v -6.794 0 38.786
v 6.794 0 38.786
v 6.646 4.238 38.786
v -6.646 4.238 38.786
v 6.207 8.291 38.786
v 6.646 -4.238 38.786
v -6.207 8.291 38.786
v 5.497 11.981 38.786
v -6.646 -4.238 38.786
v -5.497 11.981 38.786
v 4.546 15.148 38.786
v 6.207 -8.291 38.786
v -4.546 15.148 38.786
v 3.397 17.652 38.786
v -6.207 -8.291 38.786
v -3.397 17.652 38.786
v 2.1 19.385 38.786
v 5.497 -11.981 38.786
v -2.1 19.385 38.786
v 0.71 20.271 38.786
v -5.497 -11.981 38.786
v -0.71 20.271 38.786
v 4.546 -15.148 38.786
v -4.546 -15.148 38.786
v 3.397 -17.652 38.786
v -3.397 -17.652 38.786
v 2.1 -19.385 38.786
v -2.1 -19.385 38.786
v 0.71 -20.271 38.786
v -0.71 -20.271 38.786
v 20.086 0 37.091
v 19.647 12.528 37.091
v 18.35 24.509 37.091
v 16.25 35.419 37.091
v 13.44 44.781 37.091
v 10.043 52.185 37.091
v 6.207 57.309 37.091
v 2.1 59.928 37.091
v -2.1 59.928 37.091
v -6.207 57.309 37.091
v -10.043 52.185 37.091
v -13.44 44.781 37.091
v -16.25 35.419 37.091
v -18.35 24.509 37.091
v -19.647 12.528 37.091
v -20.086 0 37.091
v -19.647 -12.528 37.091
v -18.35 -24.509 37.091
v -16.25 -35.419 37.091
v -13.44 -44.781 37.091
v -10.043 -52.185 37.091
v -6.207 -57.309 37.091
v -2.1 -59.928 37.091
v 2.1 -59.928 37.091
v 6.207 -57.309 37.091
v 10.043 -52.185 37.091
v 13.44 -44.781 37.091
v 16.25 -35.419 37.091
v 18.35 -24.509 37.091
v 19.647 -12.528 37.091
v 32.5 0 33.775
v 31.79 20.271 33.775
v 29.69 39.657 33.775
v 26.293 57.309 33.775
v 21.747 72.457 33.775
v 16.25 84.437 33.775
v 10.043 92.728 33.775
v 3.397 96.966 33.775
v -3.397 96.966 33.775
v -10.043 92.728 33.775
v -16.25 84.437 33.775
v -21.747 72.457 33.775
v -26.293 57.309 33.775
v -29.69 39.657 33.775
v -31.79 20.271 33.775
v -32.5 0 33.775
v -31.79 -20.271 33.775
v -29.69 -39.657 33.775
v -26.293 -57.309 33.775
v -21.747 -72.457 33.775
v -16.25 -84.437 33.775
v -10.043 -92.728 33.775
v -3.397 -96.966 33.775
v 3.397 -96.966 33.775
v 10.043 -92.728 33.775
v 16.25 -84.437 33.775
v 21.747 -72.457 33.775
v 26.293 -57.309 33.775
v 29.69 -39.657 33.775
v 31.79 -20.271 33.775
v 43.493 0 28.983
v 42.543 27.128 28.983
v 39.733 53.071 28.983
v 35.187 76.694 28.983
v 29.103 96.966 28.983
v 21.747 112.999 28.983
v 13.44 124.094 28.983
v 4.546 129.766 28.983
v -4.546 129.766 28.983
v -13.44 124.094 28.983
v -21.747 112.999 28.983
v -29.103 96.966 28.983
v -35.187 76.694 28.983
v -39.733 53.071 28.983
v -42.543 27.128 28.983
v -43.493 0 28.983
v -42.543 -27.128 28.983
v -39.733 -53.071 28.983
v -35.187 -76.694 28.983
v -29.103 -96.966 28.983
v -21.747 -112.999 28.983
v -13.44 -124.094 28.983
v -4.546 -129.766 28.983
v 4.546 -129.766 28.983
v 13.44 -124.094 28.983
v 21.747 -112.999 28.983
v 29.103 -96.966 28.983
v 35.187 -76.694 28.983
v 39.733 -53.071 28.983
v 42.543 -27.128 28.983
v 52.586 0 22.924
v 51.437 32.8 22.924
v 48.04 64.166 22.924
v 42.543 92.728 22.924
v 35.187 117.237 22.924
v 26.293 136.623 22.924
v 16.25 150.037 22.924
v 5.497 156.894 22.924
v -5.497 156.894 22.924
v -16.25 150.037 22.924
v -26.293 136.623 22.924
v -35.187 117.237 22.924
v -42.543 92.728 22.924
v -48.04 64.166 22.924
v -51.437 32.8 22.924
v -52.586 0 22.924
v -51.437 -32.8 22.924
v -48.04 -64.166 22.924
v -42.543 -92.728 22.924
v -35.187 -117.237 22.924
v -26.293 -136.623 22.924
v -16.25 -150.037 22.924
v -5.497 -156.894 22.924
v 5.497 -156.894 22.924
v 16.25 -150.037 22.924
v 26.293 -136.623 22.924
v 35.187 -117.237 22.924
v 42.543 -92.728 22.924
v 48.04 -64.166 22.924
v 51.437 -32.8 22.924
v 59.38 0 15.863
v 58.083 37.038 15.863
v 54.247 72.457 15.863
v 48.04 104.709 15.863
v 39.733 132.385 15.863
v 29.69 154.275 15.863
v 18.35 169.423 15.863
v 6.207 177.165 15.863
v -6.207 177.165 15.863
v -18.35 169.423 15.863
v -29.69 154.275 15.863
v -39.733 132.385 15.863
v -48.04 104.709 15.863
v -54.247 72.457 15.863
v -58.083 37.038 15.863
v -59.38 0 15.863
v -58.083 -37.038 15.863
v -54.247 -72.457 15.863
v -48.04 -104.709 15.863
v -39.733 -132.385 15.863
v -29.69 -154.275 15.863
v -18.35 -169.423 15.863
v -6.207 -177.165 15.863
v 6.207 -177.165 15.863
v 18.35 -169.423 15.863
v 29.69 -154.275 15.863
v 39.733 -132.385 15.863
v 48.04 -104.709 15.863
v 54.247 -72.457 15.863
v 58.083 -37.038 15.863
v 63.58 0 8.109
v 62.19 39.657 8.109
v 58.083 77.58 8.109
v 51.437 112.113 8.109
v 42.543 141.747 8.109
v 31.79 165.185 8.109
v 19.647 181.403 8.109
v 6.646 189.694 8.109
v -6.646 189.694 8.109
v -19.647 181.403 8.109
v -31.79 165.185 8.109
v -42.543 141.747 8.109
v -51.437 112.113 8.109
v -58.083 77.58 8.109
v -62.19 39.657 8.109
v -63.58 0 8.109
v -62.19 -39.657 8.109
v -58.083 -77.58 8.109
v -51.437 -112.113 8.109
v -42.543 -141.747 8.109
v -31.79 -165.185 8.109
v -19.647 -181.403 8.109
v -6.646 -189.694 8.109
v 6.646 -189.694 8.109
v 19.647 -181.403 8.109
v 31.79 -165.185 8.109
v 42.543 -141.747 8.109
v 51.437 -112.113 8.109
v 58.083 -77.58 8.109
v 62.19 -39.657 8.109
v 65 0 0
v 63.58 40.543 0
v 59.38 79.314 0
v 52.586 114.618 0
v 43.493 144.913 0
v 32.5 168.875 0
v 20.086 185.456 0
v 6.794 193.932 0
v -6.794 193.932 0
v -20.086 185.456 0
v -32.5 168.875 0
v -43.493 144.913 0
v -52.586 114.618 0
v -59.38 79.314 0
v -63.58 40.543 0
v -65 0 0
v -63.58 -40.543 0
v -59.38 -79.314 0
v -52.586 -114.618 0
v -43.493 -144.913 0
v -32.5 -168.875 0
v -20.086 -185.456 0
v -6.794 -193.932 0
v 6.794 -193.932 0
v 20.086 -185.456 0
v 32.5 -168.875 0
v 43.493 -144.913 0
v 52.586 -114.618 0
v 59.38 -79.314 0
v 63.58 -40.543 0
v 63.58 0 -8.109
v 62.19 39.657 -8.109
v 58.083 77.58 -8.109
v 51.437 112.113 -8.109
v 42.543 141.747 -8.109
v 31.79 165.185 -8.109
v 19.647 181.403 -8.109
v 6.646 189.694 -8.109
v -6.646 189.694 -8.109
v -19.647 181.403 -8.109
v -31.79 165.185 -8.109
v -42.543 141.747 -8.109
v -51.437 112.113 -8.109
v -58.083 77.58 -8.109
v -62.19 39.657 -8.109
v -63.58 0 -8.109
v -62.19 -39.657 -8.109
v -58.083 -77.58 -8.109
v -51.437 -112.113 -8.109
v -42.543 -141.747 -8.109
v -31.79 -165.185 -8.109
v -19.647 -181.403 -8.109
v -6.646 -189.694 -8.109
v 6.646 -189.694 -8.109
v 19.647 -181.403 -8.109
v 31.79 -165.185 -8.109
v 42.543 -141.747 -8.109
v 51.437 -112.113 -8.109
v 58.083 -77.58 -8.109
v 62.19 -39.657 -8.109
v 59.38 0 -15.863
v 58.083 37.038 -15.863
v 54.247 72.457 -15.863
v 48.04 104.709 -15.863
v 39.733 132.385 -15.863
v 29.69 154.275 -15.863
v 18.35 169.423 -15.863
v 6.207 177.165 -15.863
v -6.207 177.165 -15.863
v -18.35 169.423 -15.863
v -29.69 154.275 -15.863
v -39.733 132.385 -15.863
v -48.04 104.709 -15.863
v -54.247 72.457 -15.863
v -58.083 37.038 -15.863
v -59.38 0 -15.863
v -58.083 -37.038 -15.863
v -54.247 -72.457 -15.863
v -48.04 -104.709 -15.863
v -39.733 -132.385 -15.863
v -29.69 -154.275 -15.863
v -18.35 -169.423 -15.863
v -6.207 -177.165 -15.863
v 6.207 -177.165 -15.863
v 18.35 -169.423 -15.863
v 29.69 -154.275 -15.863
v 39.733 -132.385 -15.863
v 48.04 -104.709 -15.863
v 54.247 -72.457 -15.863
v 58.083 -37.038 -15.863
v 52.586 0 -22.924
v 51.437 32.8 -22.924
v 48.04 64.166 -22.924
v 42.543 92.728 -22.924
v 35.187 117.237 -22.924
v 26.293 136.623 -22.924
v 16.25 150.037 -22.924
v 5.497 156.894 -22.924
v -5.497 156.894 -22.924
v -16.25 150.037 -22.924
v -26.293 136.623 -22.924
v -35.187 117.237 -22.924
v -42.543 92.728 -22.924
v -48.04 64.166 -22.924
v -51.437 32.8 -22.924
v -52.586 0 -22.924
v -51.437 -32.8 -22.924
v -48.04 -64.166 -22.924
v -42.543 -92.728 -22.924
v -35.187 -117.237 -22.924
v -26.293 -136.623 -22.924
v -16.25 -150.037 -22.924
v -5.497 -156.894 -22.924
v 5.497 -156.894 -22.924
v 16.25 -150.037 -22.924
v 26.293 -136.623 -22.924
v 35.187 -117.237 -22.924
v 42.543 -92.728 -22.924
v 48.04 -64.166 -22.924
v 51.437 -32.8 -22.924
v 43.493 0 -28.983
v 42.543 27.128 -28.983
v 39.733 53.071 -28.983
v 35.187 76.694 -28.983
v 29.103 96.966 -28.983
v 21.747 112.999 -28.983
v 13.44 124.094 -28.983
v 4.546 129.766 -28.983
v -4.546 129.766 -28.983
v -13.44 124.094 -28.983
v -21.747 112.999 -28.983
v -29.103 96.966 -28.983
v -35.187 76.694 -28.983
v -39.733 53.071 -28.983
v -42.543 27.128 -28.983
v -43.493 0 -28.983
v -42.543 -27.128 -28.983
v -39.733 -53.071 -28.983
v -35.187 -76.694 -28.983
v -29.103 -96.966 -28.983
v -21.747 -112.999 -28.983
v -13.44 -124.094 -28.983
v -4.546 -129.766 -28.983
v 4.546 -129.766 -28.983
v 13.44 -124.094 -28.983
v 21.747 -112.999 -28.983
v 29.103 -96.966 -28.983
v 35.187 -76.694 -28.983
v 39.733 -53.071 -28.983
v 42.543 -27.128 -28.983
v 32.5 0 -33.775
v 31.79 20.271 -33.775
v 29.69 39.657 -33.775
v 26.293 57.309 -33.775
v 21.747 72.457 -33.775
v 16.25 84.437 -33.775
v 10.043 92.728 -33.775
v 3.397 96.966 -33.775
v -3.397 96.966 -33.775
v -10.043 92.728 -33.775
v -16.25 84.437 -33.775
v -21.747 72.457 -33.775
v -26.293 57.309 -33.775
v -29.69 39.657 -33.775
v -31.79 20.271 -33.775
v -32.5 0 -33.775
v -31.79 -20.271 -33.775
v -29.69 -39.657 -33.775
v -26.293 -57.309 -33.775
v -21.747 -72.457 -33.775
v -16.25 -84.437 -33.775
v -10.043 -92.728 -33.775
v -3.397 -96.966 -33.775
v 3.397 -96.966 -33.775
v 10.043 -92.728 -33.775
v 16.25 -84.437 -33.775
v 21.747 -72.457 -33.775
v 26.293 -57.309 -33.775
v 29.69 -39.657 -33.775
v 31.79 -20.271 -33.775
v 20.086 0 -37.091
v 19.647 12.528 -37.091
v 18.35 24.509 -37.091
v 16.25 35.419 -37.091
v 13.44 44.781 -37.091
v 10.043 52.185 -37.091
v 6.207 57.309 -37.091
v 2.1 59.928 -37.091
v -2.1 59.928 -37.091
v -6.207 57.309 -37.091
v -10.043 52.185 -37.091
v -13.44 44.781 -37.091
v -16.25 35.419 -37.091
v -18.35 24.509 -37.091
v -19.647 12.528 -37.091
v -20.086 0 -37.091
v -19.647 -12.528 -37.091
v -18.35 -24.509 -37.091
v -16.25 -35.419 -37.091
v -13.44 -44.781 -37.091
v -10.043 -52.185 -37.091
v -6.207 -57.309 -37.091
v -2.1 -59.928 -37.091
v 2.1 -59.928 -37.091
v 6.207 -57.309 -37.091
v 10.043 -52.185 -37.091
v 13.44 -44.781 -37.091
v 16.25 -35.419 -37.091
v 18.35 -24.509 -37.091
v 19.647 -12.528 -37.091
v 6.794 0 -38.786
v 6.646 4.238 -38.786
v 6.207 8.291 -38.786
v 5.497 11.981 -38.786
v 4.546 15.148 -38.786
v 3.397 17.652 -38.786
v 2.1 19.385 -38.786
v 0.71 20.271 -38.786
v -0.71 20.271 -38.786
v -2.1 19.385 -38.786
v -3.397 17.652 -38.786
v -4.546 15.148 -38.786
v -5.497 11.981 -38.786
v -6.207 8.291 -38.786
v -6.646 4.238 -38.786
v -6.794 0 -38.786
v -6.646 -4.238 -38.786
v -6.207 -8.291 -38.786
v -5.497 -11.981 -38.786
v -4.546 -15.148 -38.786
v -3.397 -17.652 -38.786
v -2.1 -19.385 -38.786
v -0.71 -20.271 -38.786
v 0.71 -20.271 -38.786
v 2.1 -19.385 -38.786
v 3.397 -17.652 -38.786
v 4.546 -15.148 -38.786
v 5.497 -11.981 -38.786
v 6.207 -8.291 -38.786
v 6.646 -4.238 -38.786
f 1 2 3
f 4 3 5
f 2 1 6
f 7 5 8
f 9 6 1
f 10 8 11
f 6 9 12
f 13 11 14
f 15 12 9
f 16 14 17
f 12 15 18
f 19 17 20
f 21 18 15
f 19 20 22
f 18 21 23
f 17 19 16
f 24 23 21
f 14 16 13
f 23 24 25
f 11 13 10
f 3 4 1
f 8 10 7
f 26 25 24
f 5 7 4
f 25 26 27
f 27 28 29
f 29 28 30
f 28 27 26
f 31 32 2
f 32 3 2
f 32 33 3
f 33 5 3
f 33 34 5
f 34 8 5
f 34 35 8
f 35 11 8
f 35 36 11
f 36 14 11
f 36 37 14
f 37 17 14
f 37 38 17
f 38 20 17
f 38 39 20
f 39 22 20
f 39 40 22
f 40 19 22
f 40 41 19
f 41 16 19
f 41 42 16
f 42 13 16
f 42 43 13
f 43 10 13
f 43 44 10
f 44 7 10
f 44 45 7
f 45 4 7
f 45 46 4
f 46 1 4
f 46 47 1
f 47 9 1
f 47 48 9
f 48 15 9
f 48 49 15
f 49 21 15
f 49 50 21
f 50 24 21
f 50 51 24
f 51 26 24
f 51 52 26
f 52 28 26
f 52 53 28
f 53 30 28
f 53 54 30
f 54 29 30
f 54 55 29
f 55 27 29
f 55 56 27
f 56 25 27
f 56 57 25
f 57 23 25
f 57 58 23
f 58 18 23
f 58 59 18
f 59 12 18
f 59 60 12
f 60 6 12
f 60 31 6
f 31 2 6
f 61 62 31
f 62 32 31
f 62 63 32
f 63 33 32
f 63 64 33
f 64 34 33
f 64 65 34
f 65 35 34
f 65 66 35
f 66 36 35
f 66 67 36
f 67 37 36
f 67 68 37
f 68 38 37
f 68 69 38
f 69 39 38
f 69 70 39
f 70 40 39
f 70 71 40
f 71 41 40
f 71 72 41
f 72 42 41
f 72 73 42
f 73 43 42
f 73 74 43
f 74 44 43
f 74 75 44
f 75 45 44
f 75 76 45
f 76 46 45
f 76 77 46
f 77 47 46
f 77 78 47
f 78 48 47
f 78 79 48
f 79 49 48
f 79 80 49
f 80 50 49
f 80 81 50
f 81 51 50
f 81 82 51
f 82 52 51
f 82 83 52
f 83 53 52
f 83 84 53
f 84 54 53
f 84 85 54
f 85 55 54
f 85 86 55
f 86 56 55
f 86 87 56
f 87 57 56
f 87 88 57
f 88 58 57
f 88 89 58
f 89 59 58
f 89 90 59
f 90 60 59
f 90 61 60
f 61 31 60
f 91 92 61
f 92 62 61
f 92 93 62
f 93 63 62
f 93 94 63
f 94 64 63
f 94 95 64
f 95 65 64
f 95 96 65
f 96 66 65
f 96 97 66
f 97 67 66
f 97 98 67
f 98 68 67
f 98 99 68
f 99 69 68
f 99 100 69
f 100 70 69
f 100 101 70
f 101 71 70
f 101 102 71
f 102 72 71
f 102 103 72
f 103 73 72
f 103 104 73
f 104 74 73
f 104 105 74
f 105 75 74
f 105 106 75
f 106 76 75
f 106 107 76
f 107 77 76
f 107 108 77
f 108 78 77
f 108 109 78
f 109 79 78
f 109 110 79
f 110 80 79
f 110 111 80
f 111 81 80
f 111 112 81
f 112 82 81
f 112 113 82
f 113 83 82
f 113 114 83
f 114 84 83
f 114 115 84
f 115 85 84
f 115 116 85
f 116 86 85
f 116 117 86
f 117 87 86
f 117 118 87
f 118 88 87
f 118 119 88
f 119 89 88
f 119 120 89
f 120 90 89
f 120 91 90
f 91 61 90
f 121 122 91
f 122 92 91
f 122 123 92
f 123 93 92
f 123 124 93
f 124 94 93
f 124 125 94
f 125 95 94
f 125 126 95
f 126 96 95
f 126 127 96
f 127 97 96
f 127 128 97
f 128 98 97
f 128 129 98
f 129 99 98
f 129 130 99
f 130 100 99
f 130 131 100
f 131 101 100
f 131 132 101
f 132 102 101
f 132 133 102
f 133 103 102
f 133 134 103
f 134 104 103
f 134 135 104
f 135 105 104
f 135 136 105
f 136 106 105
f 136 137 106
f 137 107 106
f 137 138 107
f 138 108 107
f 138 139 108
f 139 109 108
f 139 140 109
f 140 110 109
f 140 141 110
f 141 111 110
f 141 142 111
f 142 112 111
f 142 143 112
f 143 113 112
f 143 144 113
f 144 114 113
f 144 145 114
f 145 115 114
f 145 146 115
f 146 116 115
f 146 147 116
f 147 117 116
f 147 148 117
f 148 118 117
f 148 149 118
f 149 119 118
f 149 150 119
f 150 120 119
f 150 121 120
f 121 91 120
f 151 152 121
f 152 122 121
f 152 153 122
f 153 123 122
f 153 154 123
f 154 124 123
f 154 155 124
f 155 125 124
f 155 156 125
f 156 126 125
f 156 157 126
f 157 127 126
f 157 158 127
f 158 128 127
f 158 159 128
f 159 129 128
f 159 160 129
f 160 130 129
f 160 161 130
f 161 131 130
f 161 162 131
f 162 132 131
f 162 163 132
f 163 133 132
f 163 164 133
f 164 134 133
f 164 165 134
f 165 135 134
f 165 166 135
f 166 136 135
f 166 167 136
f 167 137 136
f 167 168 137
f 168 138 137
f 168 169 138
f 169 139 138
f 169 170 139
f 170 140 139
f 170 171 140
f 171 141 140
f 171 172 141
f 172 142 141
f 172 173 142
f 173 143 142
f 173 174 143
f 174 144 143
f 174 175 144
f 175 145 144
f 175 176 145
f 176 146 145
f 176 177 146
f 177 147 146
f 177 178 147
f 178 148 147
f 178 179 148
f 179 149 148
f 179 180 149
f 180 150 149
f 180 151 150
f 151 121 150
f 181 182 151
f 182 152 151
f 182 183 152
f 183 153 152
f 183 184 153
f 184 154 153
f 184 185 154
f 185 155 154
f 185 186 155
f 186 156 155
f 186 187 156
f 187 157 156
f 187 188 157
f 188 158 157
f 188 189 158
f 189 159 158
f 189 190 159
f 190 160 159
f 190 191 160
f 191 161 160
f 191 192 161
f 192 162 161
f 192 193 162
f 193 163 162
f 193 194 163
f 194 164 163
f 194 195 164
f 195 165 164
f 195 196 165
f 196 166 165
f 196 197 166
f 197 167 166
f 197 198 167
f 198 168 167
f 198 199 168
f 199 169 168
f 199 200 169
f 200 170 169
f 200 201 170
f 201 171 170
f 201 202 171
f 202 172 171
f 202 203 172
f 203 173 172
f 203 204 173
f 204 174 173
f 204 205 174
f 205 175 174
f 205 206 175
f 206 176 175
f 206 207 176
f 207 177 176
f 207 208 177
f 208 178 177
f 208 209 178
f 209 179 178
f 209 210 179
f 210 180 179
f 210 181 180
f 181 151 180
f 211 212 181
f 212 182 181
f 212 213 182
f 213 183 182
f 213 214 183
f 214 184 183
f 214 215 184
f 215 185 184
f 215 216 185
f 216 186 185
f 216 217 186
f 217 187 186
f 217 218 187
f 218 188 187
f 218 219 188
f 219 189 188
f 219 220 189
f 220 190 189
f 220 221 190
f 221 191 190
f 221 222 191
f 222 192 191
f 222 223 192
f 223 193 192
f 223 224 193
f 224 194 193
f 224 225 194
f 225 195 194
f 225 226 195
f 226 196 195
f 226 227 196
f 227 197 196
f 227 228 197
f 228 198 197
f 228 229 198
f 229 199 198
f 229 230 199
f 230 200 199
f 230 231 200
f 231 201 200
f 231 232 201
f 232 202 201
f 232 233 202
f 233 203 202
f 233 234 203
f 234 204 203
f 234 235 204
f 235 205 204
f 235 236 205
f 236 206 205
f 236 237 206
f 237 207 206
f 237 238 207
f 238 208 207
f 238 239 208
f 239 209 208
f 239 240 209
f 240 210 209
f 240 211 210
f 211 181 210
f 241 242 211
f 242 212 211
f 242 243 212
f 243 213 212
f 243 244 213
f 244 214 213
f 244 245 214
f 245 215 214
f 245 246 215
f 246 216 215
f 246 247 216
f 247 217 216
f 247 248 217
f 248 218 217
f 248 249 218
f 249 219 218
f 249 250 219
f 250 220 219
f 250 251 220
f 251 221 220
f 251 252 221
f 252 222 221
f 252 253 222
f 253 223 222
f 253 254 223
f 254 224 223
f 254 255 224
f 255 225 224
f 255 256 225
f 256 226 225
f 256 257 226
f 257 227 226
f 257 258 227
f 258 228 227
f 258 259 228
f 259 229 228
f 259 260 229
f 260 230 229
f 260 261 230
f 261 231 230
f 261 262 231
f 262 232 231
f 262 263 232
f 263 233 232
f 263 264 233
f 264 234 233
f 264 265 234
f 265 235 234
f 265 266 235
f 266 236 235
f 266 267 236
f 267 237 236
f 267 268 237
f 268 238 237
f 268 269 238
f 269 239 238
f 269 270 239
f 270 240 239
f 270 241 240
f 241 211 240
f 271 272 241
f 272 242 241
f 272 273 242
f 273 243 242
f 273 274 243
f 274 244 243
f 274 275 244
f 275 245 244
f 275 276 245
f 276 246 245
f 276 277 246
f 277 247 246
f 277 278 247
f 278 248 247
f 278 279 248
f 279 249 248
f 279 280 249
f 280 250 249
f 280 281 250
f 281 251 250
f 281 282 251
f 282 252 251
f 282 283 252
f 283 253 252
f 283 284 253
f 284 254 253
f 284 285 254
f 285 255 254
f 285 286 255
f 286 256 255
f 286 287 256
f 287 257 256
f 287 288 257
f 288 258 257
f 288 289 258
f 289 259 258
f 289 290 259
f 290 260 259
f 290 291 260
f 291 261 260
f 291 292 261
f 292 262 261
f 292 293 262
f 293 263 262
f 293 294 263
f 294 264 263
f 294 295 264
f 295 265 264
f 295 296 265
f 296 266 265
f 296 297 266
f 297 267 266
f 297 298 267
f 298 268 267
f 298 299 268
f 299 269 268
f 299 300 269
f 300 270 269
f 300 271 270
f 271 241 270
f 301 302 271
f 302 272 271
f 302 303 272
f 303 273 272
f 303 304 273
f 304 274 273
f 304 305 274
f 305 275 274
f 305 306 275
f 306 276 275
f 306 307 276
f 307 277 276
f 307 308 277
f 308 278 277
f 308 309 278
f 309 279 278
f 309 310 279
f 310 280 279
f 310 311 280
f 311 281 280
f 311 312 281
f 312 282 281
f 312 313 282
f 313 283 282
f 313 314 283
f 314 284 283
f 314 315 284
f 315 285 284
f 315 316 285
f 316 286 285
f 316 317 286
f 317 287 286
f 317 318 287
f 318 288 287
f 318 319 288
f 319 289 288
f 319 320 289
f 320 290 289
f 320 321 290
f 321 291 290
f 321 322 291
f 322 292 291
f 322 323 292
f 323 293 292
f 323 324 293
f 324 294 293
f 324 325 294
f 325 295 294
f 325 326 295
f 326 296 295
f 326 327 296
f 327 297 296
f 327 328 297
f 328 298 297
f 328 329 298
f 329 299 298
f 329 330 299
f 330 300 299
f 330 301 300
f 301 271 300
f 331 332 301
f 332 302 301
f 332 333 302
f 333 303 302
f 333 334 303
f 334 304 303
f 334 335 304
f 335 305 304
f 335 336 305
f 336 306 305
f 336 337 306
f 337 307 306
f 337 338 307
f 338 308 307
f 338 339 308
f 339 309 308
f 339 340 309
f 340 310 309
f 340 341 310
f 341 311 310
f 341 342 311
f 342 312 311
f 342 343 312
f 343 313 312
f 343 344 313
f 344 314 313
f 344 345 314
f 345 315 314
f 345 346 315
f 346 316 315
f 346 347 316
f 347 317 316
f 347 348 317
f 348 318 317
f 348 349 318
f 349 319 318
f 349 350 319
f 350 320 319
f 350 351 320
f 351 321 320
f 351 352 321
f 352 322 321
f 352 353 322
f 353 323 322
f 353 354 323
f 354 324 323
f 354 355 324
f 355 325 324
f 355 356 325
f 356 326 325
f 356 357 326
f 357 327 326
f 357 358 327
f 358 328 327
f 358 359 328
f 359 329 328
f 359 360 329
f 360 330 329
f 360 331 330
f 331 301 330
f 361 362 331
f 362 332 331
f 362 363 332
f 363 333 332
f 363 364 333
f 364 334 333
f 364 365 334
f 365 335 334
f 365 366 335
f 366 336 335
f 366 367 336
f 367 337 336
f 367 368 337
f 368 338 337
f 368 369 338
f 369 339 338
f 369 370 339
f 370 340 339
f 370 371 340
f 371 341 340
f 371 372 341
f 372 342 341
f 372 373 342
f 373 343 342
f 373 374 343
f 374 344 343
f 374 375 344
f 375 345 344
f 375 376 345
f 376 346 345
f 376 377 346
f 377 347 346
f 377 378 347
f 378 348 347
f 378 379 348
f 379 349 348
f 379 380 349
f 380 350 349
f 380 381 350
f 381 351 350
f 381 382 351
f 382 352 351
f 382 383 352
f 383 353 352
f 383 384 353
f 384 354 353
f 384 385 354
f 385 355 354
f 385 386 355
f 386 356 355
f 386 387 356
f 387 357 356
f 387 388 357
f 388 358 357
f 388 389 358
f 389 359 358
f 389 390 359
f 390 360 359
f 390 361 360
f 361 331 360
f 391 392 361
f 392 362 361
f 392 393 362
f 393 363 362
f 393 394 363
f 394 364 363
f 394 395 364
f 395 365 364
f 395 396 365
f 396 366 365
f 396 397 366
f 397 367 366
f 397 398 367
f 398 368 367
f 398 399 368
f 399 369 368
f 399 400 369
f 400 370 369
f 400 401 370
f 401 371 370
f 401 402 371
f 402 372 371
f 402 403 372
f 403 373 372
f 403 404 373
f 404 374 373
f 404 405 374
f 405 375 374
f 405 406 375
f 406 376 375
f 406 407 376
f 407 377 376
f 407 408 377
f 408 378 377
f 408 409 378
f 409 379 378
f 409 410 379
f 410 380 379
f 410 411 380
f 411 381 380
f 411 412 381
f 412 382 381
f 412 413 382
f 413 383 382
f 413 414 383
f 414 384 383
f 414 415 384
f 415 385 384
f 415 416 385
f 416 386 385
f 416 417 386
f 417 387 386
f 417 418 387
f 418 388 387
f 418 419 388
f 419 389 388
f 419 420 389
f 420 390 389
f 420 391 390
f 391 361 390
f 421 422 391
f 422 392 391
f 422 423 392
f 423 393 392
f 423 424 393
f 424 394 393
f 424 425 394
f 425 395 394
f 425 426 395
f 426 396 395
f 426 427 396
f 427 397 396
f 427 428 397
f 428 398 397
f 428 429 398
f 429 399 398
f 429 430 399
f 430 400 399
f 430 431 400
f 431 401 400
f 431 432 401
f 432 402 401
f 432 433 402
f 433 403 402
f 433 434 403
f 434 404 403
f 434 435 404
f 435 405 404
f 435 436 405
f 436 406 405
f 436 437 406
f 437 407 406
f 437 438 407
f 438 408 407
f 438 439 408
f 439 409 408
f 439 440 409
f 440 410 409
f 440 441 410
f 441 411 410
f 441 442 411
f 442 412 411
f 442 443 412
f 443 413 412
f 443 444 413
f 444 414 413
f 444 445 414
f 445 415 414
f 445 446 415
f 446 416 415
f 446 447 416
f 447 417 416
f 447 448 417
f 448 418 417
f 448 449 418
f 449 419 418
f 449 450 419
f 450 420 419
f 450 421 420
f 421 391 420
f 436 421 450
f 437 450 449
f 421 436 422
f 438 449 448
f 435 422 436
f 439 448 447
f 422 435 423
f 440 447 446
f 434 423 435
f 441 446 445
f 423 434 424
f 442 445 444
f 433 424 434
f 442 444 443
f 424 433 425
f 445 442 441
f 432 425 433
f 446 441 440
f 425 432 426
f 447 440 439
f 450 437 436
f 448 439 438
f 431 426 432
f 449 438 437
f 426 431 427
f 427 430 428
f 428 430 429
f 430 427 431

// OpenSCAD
// Generated by SolidPython 1.0.1 on 2020-07-29 00:46:46


scale(v = [5, 15, 3]) {
	sphere(r = 13);
}
/***********************************************
*********      SolidPython code:      **********
************************************************
 
# import packages: SolidPython
from solid import *
from solid.utils import *
from itertools import chain, combinations, permutations


class Resize:

    def __init__(self, scad_file):
        self.scad_file = scad_file
        #self.scad_file = import_scad(scad_file)
        # cone/cylinder param:
        self.r1 = 0
        self.r2 = 0
        self.h = 0
        # rectangular prism param:
        self.w = 0
        self.l = 0
        # ellipse param:
        self.r = 0

    # import OpenScad code (file name corresponds to shape)


    # classify shape + parameters
    def assign(self, param1, param2, param3):
        if self.scad_file == 'cone.scad':
            self.r1 = param1
            self.r2 = param2
            self.h = param3
        elif self.scad_file == 'cylinder.scad':
            self.r1 = param1
            self.r2 = param2
            self.h = param3
        elif self.scad_file == 'rectangularPrism.scad':
            self.h = param1
            self.l = param2
            self.w = param3
        else:
            self.r = param1
            self.h = param2

    # resize parameters
    def iterate(self):
        x = range(3, 20, 2)
        i = 1
        if self.scad_file == 'cone.scad':
            tempList = list(permutations(x, 2))
            for temp in tempList:
                param1 = temp[0]
                param2 = temp[1]
                filepath = 'produced_scad_files/' + 'cone' + str(param1) + '_' + str(param2) + '_' + '.scad'
                scad_render_to_file(cylinder(h=param1, r1=param2, r2=0), filepath)

        elif self.scad_file == 'cylinder.scad':
            tempList = list(permutations(x, 3))
            for temp in tempList:
                param1 = temp[0]
                param2 = temp[1]
                filepath = 'produced_scad_files/' + 'cylinder' + str(param1) + '_' + str(param2) + '_' + '.scad'
                scad_render_to_file(cylinder(h=param1, r1=param2, r2=param2), filepath)

        elif self.scad_file == 'rectangularPrism.scad':
            tempList = list(permutations(x, 3))
            for temp in tempList:
                param1 = temp[0]
                param2 = temp[1]
                param3 = temp[2]
                filepath = 'produced_scad_files/' + 'rectangularPrism' + str(param1) + '_' + str(param2) + '_' + str(
                    param3) + '.scad'
                scad_render_to_file(cube(size=(param1, param2, param3)), filepath)

        elif self.scad_file == 'ellipse.scad':
            tempList = list(permutations(x, 4))
            for temp in tempList:
                param1 = temp[0]
                param2 = temp[1]
                param3 = temp[2]
                param4 = temp[3]
                filepath = 'produced_scad_files/' + 'ellipse' + str(param1) + '_' + str(param2) + '_' + str(param3) + '_' + str(param4) + '.scad'
                scad_render_to_file(scale([param1, param2, param3])(sphere(r=param4)), filepath)

    def render_to_scadfile(self):
        scad_render_to_file(scad, 'example.scad') 
 
************************************************/
